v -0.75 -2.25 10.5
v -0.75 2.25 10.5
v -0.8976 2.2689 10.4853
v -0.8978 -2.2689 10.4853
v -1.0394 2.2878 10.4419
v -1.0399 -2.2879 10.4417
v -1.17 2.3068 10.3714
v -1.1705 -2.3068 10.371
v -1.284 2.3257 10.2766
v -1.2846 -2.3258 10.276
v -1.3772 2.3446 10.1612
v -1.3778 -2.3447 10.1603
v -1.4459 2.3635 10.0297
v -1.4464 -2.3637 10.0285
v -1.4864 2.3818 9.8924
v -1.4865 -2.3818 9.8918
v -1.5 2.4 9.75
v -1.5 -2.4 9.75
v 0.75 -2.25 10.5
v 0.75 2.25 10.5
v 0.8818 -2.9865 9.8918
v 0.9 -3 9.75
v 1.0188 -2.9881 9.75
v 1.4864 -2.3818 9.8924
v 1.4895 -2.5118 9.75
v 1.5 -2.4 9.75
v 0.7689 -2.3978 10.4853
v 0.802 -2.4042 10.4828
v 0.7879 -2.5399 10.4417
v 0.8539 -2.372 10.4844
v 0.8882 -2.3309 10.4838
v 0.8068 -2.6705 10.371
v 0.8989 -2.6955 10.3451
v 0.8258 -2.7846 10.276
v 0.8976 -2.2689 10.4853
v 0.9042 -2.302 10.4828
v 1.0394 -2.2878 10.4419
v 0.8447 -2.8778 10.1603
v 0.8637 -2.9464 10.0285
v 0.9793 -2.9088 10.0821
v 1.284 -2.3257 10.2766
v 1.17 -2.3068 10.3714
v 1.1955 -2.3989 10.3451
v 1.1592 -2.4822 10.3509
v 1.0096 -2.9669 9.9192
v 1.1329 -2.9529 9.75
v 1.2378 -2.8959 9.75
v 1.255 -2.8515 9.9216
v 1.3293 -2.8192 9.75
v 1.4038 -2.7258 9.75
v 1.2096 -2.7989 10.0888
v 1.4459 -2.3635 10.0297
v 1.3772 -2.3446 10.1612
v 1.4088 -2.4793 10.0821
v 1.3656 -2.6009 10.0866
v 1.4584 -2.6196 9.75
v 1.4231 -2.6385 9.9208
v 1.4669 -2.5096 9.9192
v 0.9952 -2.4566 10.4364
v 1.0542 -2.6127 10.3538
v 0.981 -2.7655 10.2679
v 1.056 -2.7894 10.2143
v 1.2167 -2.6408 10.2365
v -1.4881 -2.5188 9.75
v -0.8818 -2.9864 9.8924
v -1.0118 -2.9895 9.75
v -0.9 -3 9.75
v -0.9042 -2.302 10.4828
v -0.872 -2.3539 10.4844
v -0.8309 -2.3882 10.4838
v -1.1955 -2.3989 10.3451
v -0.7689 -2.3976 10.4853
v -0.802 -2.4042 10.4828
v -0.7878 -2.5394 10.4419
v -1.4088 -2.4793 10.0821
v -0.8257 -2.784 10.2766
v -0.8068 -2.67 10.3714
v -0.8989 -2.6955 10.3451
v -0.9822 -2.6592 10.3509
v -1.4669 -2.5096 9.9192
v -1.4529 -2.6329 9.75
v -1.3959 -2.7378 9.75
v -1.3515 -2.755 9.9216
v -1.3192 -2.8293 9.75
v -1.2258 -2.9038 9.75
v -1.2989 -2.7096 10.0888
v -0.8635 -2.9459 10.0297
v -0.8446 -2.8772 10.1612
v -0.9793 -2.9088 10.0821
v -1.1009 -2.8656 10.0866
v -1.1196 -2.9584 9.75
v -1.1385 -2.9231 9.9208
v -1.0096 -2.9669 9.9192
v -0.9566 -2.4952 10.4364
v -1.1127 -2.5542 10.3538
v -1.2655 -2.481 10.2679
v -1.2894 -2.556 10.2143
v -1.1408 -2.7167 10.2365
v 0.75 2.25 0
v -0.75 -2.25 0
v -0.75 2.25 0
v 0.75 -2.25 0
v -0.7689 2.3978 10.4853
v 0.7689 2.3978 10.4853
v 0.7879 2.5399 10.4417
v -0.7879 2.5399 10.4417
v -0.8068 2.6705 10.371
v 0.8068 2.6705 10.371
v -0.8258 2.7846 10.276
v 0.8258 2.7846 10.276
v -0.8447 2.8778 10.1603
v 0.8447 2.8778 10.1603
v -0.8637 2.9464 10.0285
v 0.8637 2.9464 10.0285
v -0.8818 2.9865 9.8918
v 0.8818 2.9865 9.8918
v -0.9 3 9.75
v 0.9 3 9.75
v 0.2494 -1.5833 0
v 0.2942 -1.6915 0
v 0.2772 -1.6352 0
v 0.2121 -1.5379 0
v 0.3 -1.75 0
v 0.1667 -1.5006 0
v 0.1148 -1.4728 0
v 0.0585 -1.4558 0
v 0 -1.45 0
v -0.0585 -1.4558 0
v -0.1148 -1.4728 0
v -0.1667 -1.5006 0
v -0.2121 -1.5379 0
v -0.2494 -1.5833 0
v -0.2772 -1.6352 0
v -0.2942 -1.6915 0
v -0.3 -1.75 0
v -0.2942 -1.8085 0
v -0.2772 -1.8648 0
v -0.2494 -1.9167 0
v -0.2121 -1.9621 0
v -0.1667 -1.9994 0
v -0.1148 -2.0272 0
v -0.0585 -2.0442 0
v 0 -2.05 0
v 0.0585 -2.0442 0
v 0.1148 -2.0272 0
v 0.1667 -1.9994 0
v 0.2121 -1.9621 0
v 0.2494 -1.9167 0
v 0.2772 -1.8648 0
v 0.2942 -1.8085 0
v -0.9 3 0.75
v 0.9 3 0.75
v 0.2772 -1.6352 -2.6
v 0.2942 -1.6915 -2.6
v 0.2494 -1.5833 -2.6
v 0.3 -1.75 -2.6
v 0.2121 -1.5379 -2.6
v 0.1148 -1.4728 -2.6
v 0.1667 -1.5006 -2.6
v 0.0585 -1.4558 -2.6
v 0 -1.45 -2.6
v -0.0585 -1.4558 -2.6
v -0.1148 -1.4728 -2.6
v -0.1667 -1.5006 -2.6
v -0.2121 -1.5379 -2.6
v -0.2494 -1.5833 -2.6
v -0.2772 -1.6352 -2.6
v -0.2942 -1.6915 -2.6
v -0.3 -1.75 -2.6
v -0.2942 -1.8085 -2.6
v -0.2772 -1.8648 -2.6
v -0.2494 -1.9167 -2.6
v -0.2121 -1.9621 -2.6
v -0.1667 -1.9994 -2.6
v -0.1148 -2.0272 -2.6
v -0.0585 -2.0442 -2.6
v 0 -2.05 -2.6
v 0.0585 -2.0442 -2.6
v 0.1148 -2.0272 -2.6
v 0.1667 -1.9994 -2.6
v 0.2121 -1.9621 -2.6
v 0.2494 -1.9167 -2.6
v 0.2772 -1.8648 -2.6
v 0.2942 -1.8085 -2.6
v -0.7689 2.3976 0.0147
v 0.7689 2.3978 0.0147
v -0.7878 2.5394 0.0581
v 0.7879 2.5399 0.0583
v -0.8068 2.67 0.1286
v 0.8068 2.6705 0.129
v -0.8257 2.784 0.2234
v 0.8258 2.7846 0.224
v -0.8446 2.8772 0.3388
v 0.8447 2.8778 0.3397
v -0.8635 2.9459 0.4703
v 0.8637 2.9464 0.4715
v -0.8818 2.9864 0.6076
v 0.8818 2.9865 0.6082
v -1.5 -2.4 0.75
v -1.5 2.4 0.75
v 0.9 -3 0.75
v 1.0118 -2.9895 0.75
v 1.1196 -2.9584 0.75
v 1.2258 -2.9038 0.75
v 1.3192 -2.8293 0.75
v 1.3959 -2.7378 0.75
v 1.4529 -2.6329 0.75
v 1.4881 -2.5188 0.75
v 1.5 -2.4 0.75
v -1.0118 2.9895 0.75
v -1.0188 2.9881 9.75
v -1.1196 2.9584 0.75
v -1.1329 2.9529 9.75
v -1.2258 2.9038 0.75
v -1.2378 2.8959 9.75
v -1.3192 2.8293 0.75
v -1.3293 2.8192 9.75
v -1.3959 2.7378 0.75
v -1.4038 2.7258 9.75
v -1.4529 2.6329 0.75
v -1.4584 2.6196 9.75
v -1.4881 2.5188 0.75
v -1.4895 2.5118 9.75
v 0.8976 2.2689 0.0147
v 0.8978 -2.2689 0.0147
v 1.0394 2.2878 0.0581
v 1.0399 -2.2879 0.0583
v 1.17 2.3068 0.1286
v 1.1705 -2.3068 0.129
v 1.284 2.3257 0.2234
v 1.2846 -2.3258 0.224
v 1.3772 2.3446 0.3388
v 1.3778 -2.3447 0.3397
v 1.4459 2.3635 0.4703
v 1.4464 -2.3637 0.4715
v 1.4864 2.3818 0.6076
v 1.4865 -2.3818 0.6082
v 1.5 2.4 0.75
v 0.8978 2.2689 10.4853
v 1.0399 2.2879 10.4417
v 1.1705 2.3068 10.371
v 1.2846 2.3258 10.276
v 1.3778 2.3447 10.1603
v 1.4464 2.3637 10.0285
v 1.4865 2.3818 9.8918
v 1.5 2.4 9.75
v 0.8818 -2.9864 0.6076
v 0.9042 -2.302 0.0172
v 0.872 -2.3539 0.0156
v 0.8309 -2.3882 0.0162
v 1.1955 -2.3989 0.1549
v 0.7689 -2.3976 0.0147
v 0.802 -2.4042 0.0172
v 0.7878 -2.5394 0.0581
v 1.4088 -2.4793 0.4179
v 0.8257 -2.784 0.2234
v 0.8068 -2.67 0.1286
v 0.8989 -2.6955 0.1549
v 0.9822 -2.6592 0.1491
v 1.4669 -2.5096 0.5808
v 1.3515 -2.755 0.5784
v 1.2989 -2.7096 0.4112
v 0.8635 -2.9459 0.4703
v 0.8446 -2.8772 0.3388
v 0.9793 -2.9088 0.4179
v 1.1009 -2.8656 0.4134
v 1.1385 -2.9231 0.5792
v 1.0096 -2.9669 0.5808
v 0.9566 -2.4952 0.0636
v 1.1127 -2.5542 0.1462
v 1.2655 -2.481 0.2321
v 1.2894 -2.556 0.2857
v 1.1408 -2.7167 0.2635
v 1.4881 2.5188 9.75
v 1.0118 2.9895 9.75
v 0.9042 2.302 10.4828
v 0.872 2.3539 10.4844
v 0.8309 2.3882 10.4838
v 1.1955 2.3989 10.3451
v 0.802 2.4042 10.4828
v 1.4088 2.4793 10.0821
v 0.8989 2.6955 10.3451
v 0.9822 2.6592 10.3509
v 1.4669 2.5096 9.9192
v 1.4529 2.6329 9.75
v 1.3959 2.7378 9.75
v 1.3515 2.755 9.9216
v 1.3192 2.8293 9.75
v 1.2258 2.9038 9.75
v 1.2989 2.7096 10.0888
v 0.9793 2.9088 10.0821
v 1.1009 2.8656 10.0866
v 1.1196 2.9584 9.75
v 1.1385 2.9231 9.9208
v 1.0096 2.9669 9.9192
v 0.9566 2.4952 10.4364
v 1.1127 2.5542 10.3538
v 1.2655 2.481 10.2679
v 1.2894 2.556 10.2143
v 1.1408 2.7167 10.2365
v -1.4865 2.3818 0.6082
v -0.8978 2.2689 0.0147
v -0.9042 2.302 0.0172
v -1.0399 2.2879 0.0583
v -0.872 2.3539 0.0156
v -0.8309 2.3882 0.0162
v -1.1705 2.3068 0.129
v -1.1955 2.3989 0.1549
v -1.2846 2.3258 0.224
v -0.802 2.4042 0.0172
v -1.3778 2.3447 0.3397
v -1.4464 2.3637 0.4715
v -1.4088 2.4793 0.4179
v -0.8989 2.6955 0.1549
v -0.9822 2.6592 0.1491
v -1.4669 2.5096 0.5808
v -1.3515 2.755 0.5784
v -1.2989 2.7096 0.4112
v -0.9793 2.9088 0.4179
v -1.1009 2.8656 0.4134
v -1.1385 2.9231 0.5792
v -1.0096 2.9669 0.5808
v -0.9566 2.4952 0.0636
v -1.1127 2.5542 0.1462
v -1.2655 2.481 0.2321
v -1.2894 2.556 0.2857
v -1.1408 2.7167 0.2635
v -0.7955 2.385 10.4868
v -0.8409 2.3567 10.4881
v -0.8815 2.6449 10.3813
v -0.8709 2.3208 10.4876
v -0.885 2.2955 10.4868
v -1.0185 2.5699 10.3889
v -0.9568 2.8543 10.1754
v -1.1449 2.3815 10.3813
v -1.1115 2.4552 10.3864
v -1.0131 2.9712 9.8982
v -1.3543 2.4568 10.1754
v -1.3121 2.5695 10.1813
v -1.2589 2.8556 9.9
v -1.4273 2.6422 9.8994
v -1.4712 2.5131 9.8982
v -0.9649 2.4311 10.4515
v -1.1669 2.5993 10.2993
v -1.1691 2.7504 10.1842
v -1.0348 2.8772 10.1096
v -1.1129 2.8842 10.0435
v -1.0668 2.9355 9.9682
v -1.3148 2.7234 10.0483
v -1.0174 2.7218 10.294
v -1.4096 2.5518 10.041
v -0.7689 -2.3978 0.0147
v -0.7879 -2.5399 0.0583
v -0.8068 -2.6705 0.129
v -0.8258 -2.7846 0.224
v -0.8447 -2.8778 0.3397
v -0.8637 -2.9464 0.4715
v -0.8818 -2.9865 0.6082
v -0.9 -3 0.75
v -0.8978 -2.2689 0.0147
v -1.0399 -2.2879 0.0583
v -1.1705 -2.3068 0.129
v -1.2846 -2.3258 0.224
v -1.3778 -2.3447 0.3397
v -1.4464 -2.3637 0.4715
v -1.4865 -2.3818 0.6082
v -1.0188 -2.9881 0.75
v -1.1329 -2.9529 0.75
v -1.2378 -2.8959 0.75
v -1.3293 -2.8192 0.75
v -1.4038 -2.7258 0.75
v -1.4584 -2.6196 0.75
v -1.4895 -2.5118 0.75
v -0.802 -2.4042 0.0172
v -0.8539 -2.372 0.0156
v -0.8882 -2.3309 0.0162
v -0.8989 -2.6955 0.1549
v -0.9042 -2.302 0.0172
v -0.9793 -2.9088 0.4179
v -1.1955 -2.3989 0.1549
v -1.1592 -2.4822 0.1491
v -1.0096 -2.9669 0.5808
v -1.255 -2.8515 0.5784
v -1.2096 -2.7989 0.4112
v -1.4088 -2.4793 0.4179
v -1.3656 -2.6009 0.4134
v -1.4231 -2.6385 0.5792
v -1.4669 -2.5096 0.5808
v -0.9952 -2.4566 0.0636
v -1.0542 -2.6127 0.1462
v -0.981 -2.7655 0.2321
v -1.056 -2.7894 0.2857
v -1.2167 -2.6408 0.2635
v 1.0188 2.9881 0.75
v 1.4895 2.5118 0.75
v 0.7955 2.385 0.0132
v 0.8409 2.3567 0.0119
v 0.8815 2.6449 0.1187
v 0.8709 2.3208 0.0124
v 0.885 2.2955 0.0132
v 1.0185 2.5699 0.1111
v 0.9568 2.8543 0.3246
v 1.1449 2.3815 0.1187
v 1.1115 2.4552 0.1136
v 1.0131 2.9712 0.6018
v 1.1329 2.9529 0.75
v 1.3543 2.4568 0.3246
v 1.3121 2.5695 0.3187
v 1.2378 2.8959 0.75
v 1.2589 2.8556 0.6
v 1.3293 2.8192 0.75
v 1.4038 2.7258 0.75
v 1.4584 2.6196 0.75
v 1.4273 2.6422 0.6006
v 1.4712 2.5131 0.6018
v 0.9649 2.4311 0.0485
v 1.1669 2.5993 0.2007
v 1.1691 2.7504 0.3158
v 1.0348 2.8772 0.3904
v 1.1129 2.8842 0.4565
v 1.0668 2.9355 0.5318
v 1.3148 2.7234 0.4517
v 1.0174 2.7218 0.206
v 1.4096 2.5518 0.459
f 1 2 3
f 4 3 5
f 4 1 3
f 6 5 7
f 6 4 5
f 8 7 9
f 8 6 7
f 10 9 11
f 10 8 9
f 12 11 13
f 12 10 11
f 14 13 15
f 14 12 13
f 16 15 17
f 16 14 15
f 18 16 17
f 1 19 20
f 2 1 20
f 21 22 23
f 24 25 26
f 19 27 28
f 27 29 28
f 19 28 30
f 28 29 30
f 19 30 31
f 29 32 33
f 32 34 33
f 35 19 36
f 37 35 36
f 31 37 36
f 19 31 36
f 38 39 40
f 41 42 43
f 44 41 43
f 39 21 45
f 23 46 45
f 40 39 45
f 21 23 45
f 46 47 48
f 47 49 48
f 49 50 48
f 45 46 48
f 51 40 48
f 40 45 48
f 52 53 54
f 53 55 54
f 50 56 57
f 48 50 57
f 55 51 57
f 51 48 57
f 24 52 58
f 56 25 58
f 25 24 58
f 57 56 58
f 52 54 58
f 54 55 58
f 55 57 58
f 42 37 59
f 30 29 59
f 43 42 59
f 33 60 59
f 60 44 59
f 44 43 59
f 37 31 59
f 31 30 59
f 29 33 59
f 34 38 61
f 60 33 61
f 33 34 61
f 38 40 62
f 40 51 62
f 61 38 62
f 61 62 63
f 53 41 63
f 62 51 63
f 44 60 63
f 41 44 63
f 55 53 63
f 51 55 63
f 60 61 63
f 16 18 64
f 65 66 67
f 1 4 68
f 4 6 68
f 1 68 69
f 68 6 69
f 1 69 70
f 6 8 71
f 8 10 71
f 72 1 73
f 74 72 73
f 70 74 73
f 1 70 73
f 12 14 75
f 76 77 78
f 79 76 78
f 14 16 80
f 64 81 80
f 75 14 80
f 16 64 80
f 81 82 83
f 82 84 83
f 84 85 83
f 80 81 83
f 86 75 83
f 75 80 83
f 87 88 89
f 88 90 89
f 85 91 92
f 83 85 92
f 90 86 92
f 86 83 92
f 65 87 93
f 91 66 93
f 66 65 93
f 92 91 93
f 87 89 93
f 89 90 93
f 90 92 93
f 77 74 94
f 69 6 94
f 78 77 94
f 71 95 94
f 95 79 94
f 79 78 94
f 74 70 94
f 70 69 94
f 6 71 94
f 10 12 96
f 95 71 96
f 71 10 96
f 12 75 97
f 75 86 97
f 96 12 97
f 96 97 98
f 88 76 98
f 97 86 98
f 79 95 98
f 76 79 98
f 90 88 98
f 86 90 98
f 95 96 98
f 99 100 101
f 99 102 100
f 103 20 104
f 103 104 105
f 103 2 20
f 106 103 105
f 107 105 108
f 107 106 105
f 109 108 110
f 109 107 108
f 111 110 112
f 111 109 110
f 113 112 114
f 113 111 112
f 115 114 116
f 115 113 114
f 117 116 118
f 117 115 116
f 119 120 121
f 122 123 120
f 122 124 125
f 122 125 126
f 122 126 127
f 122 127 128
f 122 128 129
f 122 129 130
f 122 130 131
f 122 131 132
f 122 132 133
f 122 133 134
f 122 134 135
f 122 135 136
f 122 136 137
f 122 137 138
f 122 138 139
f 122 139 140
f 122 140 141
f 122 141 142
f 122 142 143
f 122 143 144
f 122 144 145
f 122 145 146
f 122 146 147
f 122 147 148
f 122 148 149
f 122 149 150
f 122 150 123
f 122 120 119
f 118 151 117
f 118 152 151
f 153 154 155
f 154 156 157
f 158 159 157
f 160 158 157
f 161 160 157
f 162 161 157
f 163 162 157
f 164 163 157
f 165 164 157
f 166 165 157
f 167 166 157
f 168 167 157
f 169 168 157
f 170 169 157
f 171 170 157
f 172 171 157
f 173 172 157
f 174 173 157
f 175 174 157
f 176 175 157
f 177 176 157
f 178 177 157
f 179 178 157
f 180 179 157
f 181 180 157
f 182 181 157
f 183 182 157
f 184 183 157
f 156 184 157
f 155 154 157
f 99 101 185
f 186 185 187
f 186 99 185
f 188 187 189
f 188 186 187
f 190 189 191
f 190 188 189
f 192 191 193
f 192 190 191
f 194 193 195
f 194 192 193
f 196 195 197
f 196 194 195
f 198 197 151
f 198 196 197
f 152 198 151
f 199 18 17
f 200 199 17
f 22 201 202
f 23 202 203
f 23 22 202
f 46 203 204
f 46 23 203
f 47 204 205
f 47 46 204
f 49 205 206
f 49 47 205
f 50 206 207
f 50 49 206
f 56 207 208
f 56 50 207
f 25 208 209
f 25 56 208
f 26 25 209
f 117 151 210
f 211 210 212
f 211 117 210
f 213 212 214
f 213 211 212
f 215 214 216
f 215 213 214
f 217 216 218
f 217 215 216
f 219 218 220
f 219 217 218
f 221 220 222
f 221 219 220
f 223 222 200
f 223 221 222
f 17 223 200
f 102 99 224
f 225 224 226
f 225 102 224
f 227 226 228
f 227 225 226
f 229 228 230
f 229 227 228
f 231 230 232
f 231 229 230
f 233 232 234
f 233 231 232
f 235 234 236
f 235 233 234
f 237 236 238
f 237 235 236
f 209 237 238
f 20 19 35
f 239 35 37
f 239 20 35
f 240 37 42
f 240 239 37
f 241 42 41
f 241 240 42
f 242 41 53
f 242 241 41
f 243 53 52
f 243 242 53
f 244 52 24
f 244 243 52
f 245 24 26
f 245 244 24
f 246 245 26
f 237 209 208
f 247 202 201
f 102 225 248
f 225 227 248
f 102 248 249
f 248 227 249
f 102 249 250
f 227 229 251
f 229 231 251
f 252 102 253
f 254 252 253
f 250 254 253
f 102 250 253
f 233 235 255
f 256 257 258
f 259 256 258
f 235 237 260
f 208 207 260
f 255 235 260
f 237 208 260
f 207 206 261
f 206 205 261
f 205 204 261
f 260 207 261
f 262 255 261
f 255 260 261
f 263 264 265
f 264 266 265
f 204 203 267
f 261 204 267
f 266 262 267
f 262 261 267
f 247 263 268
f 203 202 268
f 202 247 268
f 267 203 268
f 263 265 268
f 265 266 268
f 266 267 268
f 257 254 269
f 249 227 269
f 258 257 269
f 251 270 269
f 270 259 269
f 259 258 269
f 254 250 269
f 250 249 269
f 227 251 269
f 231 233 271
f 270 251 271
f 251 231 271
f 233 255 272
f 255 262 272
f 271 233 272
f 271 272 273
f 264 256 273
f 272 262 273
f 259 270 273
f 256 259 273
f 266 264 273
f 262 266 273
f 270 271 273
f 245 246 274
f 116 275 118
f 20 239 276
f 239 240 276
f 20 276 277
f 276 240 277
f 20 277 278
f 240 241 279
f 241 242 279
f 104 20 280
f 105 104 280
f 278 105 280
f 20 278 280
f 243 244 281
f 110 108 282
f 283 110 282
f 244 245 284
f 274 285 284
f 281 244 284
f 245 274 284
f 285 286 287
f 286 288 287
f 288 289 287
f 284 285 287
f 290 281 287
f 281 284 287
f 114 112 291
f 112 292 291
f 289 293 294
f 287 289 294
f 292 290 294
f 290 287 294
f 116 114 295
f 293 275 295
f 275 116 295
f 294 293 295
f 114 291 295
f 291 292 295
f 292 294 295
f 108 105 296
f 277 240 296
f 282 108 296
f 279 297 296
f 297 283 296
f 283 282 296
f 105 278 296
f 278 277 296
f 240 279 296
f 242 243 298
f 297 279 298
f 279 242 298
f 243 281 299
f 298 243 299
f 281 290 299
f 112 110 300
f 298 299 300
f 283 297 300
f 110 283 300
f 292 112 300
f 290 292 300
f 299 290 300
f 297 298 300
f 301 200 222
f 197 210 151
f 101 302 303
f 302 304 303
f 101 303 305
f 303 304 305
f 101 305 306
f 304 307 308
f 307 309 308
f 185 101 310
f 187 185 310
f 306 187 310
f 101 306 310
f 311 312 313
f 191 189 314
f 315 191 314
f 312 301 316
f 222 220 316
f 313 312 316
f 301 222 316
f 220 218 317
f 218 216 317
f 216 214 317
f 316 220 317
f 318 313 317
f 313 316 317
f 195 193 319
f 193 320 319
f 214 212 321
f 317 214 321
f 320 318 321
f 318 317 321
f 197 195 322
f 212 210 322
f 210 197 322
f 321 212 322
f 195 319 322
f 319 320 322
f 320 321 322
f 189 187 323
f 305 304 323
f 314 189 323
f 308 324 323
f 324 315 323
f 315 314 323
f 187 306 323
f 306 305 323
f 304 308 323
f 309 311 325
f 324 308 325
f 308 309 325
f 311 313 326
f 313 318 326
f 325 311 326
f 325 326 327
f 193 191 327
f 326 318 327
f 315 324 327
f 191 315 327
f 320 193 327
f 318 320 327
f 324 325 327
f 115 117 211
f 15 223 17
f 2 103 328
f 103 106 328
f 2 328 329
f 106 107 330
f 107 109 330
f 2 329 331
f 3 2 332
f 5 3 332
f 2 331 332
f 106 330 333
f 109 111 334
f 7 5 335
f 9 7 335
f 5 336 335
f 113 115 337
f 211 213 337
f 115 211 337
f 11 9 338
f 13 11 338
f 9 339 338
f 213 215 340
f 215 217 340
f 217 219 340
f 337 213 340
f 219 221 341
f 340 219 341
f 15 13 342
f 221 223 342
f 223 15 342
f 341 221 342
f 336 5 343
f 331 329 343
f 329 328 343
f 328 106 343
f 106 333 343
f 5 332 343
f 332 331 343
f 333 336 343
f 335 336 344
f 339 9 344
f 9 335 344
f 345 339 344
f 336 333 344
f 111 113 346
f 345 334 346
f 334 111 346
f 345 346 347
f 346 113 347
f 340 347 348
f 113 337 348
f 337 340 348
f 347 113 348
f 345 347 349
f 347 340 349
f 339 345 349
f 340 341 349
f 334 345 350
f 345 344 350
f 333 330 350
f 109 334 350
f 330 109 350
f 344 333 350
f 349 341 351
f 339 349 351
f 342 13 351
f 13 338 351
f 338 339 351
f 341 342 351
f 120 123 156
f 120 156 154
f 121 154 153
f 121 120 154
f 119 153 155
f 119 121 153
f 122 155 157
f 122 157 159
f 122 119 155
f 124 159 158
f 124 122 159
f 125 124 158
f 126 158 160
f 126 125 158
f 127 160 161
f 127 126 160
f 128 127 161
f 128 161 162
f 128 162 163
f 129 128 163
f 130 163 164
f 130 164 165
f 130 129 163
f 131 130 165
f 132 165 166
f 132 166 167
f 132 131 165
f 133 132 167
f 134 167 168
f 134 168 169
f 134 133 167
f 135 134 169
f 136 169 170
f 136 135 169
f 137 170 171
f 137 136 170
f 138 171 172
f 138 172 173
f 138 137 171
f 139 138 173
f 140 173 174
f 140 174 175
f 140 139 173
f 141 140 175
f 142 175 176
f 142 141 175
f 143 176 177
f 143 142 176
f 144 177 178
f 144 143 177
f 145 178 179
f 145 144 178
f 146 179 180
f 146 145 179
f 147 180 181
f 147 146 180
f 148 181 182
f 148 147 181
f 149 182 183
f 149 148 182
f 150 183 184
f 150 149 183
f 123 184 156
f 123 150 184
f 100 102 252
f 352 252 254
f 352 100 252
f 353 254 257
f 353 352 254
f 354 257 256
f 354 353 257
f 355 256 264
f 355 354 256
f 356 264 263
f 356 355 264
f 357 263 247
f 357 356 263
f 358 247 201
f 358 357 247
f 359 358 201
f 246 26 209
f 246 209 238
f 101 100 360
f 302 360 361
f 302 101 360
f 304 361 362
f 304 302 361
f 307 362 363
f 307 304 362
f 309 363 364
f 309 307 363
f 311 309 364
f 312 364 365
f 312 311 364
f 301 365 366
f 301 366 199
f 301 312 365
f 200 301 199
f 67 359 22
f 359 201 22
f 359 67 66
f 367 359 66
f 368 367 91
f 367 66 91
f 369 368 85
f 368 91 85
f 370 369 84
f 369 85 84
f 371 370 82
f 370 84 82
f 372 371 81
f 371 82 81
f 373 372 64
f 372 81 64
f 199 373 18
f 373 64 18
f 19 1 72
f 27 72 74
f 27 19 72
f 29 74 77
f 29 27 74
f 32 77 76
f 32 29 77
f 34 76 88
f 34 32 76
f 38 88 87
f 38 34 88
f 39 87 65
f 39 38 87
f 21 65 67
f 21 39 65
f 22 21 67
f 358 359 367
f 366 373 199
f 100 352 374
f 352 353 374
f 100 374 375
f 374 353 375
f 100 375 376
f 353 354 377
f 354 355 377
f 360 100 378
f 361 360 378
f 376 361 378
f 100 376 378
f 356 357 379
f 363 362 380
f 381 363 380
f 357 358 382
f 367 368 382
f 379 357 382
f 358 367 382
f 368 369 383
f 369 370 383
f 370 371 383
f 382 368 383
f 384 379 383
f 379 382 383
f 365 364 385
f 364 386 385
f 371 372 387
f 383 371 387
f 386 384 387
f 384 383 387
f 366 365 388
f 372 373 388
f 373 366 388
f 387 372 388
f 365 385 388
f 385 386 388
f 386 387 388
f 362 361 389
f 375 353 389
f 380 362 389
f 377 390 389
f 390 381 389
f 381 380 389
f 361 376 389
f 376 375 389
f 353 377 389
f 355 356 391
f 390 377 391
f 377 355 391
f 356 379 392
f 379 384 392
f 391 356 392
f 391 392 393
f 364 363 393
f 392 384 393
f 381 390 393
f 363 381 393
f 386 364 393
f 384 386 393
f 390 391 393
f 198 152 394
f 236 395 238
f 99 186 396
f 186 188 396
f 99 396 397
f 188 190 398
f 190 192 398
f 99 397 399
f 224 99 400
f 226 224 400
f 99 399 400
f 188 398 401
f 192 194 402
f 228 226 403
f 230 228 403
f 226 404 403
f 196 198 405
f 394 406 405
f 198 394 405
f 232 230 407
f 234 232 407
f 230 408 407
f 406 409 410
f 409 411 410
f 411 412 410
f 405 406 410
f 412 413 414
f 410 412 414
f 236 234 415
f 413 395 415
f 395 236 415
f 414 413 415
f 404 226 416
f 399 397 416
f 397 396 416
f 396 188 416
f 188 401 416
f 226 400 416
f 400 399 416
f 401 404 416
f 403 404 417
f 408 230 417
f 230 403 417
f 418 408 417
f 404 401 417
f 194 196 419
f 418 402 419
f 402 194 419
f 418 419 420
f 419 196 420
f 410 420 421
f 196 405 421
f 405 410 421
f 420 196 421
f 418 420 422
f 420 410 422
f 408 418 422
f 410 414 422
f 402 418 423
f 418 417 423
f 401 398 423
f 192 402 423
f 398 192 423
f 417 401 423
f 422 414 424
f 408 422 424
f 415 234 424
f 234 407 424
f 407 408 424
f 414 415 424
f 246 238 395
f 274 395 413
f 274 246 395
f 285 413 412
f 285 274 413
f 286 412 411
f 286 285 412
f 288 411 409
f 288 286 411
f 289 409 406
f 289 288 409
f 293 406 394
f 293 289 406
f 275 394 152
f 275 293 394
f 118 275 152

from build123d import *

# Parameters (mm, degrees)
SKETCH_W     = 6
SKETCH_H     = 10.5
PAD_DEPTH    = 1.5
FILLET_R     = 0.6
FILLET001_R  = 0.75
SKETCH001_R  = 0.3
PAD001_DEPTH = 2.6


with BuildPart() as body:
    # Sketch → Pad (new body, symmetric)
    with BuildSketch(Plane.YZ):
        with Locations((0, 5.25)):
            Rectangle(SKETCH_W, SKETCH_H)
    extrude(amount=PAD_DEPTH, both=True)

    # Fillet
    fillet_edges = [body.edges().sort_by_distance(p)[0] for p in [
        (-1.5, 3, 5.25),
        (-1.5, -3, 5.25),
        (1.5, 3, 5.25),
        (1.5, -3, 5.25),
    ]]
    fillet(fillet_edges, radius=FILLET_R)

    # Fillet001
    fillet001_edges = [body.edges().sort_by_distance(p)[0] for p in [
        (0, 3, 10.5),
        (1.324264, 2.824264, 10.5),
        (1.5, 0, 10.5),
        (1.324264, -2.824264, 10.5),
        (0, -3, 10.5),
        (-1.324264, -2.824264, 10.5),
        (-1.5, 0, 10.5),
        (-1.324264, 2.824264, 10.5),
        (-1.5, 0, 0),
        (-1.324264, -2.824264, 0),
        (0, -3, 0),
        (1.324264, -2.824264, 0),
        (1.5, 0, 0),
        (1.324264, 2.824264, 0),
        (0, 3, 0),
        (-1.324264, 2.824264, 0),
    ]]
    fillet(fillet001_edges, radius=FILLET001_R)


with BuildPart() as leadclone:
    # Sketch001 → Pad001 (new body)
    with BuildSketch(Plane(origin=(0, 1.75, 0), x_dir=(1, 0, 0), z_dir=(0, 0, 1))):
        Circle(SKETCH001_R)
    extrude(amount=-PAD001_DEPTH)


with BuildPart() as leadclone_1:
    # Body002 placement: moved
    add(leadclone.part.moved(Location((0, -3.5, 0))))


solid = Compound([body.part, leadclone_1.part])
